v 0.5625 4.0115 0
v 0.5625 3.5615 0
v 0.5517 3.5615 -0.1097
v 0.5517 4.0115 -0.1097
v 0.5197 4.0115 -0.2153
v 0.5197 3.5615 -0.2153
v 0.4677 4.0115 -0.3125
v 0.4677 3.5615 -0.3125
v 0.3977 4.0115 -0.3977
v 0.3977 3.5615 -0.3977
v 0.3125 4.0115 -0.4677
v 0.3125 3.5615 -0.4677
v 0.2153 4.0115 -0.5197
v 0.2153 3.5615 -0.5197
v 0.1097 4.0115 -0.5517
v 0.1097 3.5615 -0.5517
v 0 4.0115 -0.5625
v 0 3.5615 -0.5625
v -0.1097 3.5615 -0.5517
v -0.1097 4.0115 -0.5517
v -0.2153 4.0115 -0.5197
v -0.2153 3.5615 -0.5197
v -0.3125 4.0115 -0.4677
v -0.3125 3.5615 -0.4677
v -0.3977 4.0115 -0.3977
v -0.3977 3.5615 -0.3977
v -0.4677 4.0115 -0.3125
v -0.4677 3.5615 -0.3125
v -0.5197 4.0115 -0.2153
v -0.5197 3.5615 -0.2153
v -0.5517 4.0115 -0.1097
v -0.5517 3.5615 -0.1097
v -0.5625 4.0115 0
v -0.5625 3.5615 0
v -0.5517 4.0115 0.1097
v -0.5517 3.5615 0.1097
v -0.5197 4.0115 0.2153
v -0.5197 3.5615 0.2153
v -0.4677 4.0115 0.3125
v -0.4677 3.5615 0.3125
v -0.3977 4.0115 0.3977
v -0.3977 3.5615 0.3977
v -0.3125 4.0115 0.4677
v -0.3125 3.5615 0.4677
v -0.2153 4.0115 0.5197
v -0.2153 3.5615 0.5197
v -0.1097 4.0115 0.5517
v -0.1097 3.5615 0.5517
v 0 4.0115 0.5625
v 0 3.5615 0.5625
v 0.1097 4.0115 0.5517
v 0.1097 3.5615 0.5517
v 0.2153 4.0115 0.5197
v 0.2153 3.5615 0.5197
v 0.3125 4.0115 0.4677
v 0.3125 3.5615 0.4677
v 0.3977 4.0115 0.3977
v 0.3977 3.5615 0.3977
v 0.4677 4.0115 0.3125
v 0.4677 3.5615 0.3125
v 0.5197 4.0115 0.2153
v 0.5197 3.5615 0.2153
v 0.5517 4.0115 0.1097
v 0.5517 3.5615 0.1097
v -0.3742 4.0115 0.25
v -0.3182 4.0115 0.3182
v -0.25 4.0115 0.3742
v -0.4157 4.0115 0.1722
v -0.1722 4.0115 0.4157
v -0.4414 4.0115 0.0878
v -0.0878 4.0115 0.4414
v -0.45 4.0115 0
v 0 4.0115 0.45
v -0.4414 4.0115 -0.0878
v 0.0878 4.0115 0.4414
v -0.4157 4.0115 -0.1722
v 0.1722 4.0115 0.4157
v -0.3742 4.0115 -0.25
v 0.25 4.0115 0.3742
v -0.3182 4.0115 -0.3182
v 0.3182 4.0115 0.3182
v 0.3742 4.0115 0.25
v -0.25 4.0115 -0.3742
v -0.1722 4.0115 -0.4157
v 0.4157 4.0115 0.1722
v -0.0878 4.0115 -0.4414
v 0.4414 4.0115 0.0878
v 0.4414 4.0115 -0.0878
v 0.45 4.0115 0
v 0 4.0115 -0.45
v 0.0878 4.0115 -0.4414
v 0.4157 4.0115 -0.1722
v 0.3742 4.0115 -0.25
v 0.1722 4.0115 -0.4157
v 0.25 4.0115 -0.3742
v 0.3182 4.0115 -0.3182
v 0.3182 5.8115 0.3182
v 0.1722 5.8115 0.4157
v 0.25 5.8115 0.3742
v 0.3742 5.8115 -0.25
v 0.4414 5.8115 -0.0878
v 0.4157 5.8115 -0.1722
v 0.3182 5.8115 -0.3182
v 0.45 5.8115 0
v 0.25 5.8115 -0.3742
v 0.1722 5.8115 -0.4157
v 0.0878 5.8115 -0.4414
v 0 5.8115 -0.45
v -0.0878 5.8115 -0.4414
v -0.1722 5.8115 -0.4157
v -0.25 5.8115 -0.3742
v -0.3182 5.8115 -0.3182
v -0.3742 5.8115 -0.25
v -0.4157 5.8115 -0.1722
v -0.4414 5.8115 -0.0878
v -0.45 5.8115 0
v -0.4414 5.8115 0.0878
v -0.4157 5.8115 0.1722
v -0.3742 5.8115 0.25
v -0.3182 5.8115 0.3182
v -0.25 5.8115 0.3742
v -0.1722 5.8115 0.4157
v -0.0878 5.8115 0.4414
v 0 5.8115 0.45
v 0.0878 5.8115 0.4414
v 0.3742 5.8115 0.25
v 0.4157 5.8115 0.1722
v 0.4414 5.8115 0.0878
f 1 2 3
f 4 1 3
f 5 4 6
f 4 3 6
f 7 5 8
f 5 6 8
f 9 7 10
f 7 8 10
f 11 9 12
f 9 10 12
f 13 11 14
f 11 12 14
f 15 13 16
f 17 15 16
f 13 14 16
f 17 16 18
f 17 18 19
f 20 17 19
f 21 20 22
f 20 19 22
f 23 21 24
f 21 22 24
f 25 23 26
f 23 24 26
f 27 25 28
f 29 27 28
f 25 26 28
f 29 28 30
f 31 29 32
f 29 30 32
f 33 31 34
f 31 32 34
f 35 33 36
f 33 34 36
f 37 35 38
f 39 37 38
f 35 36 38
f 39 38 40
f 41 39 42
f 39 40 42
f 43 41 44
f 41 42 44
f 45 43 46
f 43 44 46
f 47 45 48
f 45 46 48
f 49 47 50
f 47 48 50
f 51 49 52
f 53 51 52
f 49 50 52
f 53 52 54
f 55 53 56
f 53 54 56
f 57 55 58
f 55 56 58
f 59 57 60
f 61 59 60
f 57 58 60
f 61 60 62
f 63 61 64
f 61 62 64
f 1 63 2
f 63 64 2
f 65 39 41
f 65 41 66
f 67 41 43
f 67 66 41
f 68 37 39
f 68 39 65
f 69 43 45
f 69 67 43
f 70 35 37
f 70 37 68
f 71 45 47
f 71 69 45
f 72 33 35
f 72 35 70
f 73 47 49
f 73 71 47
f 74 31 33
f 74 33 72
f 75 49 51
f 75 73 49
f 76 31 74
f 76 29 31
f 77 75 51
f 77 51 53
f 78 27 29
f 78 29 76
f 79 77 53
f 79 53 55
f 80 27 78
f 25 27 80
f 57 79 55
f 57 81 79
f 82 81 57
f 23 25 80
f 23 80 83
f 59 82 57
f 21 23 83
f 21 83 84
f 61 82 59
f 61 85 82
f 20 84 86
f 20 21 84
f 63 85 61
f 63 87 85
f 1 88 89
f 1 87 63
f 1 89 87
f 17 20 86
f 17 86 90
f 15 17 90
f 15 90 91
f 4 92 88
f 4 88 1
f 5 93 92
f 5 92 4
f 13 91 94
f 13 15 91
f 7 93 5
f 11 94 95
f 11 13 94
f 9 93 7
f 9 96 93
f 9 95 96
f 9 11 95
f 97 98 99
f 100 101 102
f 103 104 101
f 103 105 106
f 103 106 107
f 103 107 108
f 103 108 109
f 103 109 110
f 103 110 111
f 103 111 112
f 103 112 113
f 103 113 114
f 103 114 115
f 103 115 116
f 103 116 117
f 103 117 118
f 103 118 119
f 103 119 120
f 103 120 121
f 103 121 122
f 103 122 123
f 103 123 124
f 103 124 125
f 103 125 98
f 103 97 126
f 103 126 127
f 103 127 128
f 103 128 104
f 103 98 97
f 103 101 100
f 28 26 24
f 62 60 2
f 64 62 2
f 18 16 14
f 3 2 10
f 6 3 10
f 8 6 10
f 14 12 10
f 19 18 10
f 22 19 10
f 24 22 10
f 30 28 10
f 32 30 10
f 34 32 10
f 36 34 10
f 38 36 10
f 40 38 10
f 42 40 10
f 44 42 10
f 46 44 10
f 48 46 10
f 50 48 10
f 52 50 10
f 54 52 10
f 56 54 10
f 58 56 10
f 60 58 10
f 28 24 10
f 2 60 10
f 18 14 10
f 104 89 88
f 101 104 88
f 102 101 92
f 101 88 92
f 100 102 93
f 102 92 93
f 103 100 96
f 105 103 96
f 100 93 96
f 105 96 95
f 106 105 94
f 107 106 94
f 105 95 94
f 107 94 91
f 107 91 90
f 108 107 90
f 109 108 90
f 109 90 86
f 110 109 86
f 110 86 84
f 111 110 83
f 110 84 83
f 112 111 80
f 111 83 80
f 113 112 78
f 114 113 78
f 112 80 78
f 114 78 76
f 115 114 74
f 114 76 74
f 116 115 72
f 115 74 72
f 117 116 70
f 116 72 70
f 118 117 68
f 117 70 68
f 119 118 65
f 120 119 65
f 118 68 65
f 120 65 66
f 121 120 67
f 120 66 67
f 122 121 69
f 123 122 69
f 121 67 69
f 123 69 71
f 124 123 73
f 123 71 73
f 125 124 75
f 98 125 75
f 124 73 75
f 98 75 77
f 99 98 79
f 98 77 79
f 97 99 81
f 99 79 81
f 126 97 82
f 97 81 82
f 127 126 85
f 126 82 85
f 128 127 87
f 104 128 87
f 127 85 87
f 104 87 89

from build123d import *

# Parameters (mm, degrees)
SKETCH1_R           = 2.5
BOSS_EXTRUDE1_DEPTH = 2
SKETCH2_R           = 2
BOSS_EXTRUDE2_DEPTH = 8
SCALE1_SCALE        = 0.225


with BuildPart() as part:
    # Sketch1 → Boss-Extrude1 (new body)
    with BuildSketch(Plane(origin=(0, 0, 0), x_dir=(1, 0, 0), z_dir=(0, 1, 0))):
        Circle(SKETCH1_R)
    extrude(amount=BOSS_EXTRUDE1_DEPTH)

    # Sketch2 → Boss-Extrude2 (add)
    with BuildSketch(Plane(origin=(0, 2, 0), x_dir=(1, 0, 0), z_dir=(0, 1, 0))):
        Circle(SKETCH2_R)
    extrude(amount=BOSS_EXTRUDE2_DEPTH)


with BuildPart() as part_1:
    # Scale1: scaled about (0, 4.595505618, 0)
    add(part.part.scale(SCALE1_SCALE).moved(Location((0, 3.561516854, 0))))


solid = part_1.part
